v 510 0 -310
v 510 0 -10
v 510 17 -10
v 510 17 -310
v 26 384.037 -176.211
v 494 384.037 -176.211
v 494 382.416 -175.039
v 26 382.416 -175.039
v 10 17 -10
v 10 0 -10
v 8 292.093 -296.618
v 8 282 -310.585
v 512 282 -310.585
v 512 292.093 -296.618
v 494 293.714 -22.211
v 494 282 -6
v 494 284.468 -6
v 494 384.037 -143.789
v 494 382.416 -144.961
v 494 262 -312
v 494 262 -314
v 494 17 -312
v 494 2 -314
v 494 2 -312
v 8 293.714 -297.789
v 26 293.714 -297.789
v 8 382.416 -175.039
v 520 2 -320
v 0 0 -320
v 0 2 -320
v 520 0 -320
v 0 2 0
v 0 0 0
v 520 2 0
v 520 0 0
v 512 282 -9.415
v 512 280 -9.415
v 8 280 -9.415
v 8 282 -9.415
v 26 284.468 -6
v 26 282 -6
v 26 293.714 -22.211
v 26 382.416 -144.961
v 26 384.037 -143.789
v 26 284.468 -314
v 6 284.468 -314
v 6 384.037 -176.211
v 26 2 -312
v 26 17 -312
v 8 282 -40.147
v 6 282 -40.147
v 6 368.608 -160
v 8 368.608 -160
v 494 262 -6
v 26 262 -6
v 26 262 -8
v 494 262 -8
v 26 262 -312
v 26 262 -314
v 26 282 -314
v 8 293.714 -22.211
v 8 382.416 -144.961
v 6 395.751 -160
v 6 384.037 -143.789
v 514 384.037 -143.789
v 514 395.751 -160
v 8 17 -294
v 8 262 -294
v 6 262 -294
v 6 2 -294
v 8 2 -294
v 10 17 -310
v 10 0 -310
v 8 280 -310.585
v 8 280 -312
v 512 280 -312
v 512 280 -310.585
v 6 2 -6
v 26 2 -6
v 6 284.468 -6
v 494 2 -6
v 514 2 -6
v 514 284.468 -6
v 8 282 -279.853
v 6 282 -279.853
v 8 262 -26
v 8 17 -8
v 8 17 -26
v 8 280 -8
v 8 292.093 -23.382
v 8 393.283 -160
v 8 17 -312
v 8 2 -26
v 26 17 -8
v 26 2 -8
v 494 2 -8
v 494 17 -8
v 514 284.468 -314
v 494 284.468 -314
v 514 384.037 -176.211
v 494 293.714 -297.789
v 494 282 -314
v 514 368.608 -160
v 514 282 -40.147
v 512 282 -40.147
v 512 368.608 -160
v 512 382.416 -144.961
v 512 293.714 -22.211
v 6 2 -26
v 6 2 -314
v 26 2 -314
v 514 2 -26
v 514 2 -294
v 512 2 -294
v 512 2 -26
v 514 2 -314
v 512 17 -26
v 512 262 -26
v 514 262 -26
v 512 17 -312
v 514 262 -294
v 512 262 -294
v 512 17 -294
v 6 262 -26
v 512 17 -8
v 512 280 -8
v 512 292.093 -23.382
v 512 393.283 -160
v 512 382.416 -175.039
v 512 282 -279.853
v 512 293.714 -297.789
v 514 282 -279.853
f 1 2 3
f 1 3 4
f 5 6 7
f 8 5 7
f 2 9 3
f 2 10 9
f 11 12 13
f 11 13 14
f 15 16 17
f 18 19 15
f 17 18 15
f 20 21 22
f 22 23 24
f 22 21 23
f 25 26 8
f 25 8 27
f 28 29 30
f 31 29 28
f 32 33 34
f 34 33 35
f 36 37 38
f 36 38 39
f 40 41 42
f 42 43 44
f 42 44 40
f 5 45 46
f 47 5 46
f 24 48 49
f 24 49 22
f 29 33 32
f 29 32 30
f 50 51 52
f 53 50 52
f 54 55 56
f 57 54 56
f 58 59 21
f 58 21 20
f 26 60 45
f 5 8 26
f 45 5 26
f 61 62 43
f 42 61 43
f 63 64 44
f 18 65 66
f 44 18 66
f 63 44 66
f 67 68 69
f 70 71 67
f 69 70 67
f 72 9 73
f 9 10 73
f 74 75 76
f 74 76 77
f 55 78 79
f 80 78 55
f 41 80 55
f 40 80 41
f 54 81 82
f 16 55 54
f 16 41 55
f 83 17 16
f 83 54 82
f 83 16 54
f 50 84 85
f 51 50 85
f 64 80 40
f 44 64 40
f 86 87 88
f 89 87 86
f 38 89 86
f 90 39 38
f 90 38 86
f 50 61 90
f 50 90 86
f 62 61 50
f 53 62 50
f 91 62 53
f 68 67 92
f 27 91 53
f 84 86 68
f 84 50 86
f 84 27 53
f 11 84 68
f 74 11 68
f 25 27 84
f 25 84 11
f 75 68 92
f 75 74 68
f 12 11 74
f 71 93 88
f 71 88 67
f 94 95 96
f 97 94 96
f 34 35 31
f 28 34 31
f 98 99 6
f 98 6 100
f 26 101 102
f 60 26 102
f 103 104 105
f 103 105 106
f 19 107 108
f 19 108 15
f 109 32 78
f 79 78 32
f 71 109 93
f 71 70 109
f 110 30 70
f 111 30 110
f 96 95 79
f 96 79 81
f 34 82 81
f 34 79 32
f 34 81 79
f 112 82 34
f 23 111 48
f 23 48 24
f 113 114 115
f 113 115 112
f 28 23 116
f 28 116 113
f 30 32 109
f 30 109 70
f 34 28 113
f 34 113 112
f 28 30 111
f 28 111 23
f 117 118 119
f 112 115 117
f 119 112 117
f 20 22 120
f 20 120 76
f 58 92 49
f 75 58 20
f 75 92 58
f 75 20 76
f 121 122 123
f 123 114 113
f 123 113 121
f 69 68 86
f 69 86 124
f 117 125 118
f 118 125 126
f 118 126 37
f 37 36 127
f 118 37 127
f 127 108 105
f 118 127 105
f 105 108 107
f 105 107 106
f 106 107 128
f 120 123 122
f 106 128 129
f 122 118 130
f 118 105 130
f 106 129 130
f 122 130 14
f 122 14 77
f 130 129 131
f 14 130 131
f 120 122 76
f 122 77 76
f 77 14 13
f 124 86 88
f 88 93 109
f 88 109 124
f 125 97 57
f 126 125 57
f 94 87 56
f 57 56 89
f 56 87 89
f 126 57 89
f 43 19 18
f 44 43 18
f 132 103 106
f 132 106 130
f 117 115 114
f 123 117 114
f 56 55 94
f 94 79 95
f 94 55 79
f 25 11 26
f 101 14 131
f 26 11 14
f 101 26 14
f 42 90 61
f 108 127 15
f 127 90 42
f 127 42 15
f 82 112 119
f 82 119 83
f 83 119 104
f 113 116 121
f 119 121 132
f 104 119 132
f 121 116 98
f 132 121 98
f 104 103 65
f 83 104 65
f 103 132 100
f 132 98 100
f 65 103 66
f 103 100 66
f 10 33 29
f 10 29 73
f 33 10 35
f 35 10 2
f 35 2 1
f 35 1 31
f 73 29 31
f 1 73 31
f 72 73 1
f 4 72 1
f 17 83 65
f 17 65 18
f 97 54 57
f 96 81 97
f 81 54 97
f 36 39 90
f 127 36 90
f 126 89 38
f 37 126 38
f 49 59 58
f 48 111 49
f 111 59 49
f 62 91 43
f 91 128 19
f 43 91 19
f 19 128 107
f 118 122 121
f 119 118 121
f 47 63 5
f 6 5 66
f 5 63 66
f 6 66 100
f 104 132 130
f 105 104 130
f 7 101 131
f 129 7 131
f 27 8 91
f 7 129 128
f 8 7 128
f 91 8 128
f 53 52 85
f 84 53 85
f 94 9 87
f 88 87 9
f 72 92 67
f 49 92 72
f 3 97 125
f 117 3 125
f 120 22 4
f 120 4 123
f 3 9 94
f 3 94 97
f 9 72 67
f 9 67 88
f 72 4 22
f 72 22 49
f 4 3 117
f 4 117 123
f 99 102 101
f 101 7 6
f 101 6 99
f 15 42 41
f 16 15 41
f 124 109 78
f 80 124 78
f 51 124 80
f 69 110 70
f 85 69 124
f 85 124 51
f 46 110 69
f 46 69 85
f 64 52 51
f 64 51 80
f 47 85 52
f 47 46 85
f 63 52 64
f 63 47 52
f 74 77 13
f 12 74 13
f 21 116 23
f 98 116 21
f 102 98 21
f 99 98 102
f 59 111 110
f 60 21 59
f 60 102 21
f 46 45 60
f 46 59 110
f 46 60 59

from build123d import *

# Parameters (mm, degrees)
SKIZZE1_W                        = 520
SKIZZE1_H                        = 320
SKIZZE1_W_2                      = 500
SKIZZE1_H_2                      = 300
AUFSATZ_LINEAR_AUSTRAGEN1_DEPTH  = 2
SKIZZE2_W                        = 504
SKIZZE2_H                        = 304
SKIZZE2_W_2                      = 500
SKIZZE2_H_2                      = 300
AUFSATZ_LINEAR_AUSTRAGEN2_DEPTH  = 15
AUFSATZ_LINEAR_AUSTRAGEN3_DEPTH  = 280
AUFSATZ_LINEAR_AUSTRAGEN4_REACH  = 654.656
SKIZZE4_W                        = 2
SKIZZE4_H                        = 20
AUFSATZ_LINEAR_AUSTRAGEN5_REACH  = 662.576
SKIZZE5_W                        = 2
SKIZZE5_H                        = 20
AUFSATZ_LINEAR_AUSTRAGEN7_DEPTH  = 2
AUFSATZ_LINEAR_AUSTRAGEN12_DEPTH = 254
AUFSATZ_LINEAR_AUSTRAGEN13_DEPTH = 254
AUFSATZ_LINEAR_AUSTRAGEN16_DEPTH = 504
AUFSATZ_LINEAR_AUSTRAGEN17_REACH = 737.316
SKIZZE12_W                       = 20
SKIZZE12_H                       = 2
AUFSATZ_LINEAR_AUSTRAGEN18_REACH = 624.098
SKIZZE13_W                       = 20
SKIZZE13_H                       = 2


with BuildPart() as part:
    # Skizze1 → Aufsatz-Linear austragen1 (new body)
    with BuildSketch(Plane(origin=(0, 0, 0), x_dir=(1, 0, 0), z_dir=(0, 1, 0))):
        with Locations((260, 160)):
            Rectangle(SKIZZE1_W, SKIZZE1_H)
        with Locations((260, 160)):
            Rectangle(SKIZZE1_W_2, SKIZZE1_H_2, mode=Mode.SUBTRACT)
    extrude(amount=AUFSATZ_LINEAR_AUSTRAGEN1_DEPTH)

    # Skizze2 → Aufsatz-Linear austragen2 (add)
    with BuildSketch(Plane(origin=(0, 2, 0), x_dir=(1, 0, 0), z_dir=(0, 1, 0))):
        with Locations((260, 160)):
            Rectangle(SKIZZE2_W, SKIZZE2_H)
        with Locations((260, 160)):
            Rectangle(SKIZZE2_W_2, SKIZZE2_H_2, mode=Mode.SUBTRACT)
    extrude(amount=AUFSATZ_LINEAR_AUSTRAGEN2_DEPTH)

    # Skizze3 → Aufsatz-Linear austragen3 (add)
    with BuildSketch(Plane(origin=(0, 2, 0), x_dir=(1, 0, 0), z_dir=(0, 1, 0))):
        Polygon((8, 294), (6, 294), (6, 314), (26, 314), (26, 312), (8, 312), align=None)
        Polygon((512, 312), (512, 294), (514, 294), (514, 314), (494, 314), (494, 312), align=None)
        Polygon((512, 26), (514, 26), (514, 6), (494, 6), (494, 8), (512, 8), align=None)
        Polygon((8, 8), (8, 26), (6, 26), (6, 6), (26, 6), (26, 8), align=None)
    extrude(amount=AUFSATZ_LINEAR_AUSTRAGEN3_DEPTH)

    # Skizze4 → Aufsatz-Linear austragen4 (add, up to next)
    with BuildSketch(Plane(origin=(26, 0, 0), x_dir=(0, 0, -1), z_dir=(1, 0, 0)), mode=Mode.PRIVATE) as aufsatz_linear_austragen4_sk1:
        with Locations((7, 272)):
            Rectangle(SKIZZE4_W, SKIZZE4_H)
    aufsatz_linear_austragen4_tool1 = extrude(aufsatz_linear_austragen4_sk1.sketch, amount=AUFSATZ_LINEAR_AUSTRAGEN4_REACH, mode=Mode.PRIVATE) - part.part
    aufsatz_linear_austragen4 = aufsatz_linear_austragen4_tool1.solids().sort_by_distance((26, 272, -7))[0]
    add(aufsatz_linear_austragen4)

    # Spiegeln1: Aufsatz-Linear austragen4 across plane
    add(aufsatz_linear_austragen4.mirror(Plane.XY.offset(-160)))

    # Skizze5 → Aufsatz-Linear austragen5 (add, up to next)
    with BuildSketch(Plane.XY.offset(-294), mode=Mode.PRIVATE) as aufsatz_linear_austragen5_sk1:
        with Locations((513, 272)):
            Rectangle(SKIZZE5_W, SKIZZE5_H)
    aufsatz_linear_austragen5_tool1 = extrude(aufsatz_linear_austragen5_sk1.sketch, amount=AUFSATZ_LINEAR_AUSTRAGEN5_REACH, mode=Mode.PRIVATE) - part.part
    aufsatz_linear_austragen5 = aufsatz_linear_austragen5_tool1.solids().sort_by_distance((513, 272, -294))[0]
    add(aufsatz_linear_austragen5)

    # Spiegeln2: Aufsatz-Linear austragen5 across plane
    add(aufsatz_linear_austragen5.mirror(Plane(origin=(260, 0, 0), x_dir=(0, 0, 1), z_dir=(1, 0, 0))))

    # Skizze7 → Aufsatz-Linear austragen7 (add)
    with BuildSketch(Plane.ZY.offset(-6)):
        Polygon((-314, 282), (-160, 393.283421946), (-6, 282), (-40.147044848, 282), (-160, 368.608097271), (-279.852955152, 282), align=None)
    aufsatz_linear_austragen7 = extrude(amount=-AUFSATZ_LINEAR_AUSTRAGEN7_DEPTH)

    # Spiegeln5: Aufsatz-Linear austragen7 across plane
    add(aufsatz_linear_austragen7.mirror(Plane(origin=(260, 0, 0), x_dir=(0, 0, 1), z_dir=(1, 0, 0))))

    # Skizze8 → Aufsatz-Linear austragen12 (add)
    with BuildSketch(Plane(origin=(260, 0, 0), x_dir=(0, 0, -1), z_dir=(1, 0, 0))):
        Polygon((175.039121874, 382.415857367), (160, 393.283421946), (144.960878126, 382.415857367), (143.789473684, 384.036909998), (160, 395.750954413), (176.210526316, 384.036909998), align=None)
    extrude(amount=AUFSATZ_LINEAR_AUSTRAGEN12_DEPTH)

    # Skizze8<2> → Aufsatz-Linear austragen13 (add)
    with BuildSketch(Plane(origin=(260, 0, 0), x_dir=(0, 0, -1), z_dir=(1, 0, 0))):
        Polygon((175.039121874, 382.415857367), (160, 393.283421946), (144.960878126, 382.415857367), (143.789473684, 384.036909998), (160, 395.750954413), (176.210526316, 384.036909998), align=None)
    extrude(amount=-AUFSATZ_LINEAR_AUSTRAGEN13_DEPTH)

    # Skizze11 → Aufsatz-Linear austragen16 (add)
    with BuildSketch(Plane.ZY.offset(-512)):
        Polygon((-314, 282), (-312, 282), (-312, 280), (-310.585295515, 280), (-310.585295515, 282), (-296.618069243, 292.092991784), (-297.789473684, 293.714044415), align=None)
    aufsatz_linear_austragen16 = extrude(amount=AUFSATZ_LINEAR_AUSTRAGEN16_DEPTH)

    # Spiegeln6: Aufsatz-Linear austragen16 across plane
    add(aufsatz_linear_austragen16.mirror(Plane.XY.offset(-160)))

    # Aufsatz-Linear austragen17: up to this plane
    aufsatz_linear_austragen17_end = Plane(origin=(6, 282, -314), z_dir=(0, 0, 1))
    # Skizze12 → Aufsatz-Linear austragen17 (add, up to the surface)
    with BuildSketch(Plane(origin=(0, 48.090839316, 66.550696637), x_dir=(-1, 0, 0), z_dir=(0, -0.5857022207681483, -0.8105263157894748)), mode=Mode.PRIVATE) as aufsatz_linear_austragen17_sk1:
        with Locations((-16, 413.478918374)):
            Rectangle(SKIZZE12_W, SKIZZE12_H)
    aufsatz_linear_austragen17_tool1 = split(extrude(aufsatz_linear_austragen17_sk1.sketch, amount=AUFSATZ_LINEAR_AUSTRAGEN17_REACH, mode=Mode.PRIVATE), bisect_by=aufsatz_linear_austragen17_end, keep=Keep.BOTH, mode=Mode.PRIVATE)
    aufsatz_linear_austragen17 = aufsatz_linear_austragen17_tool1.solids().sort_by_distance((16, 383.226384, -175.624824))[0]
    add(aufsatz_linear_austragen17)

    # Spiegeln10: Aufsatz-Linear austragen17 across plane
    add(aufsatz_linear_austragen17.mirror(Plane(origin=(260, 0, 0), x_dir=(0, 0, 1), z_dir=(1, 0, 0))))

    # Aufsatz-Linear austragen18: up to this plane
    aufsatz_linear_austragen18_end = Plane(origin=(514, 282, -6), z_dir=(0, 0, -1))
    # Skizze13 → Aufsatz-Linear austragen18 (add, up to the surface)
    with BuildSketch(Plane(origin=(0, 200.003499524, -276.775627385), x_dir=(1, 0, 0), z_dir=(0, -0.5857022207681525, 0.8105263157894717)), mode=Mode.PRIVATE) as aufsatz_linear_austragen18_sk1:
        with Locations((16, 226.054207728)):
            Rectangle(SKIZZE13_W, SKIZZE13_H)
    aufsatz_linear_austragen18_tool1 = split(extrude(aufsatz_linear_austragen18_sk1.sketch, amount=AUFSATZ_LINEAR_AUSTRAGEN18_REACH, mode=Mode.PRIVATE), bisect_by=aufsatz_linear_austragen18_end, keep=Keep.BOTH, mode=Mode.PRIVATE)
    aufsatz_linear_austragen18 = aufsatz_linear_austragen18_tool1.solids().sort_by_distance((16, 383.226384, -144.375176))[0]
    add(aufsatz_linear_austragen18)

    # Spiegeln12: Aufsatz-Linear austragen18 across plane
    add(aufsatz_linear_austragen18.mirror(Plane(origin=(260, 0, 0), x_dir=(0, 0, 1), z_dir=(1, 0, 0))))


solid = part.part
